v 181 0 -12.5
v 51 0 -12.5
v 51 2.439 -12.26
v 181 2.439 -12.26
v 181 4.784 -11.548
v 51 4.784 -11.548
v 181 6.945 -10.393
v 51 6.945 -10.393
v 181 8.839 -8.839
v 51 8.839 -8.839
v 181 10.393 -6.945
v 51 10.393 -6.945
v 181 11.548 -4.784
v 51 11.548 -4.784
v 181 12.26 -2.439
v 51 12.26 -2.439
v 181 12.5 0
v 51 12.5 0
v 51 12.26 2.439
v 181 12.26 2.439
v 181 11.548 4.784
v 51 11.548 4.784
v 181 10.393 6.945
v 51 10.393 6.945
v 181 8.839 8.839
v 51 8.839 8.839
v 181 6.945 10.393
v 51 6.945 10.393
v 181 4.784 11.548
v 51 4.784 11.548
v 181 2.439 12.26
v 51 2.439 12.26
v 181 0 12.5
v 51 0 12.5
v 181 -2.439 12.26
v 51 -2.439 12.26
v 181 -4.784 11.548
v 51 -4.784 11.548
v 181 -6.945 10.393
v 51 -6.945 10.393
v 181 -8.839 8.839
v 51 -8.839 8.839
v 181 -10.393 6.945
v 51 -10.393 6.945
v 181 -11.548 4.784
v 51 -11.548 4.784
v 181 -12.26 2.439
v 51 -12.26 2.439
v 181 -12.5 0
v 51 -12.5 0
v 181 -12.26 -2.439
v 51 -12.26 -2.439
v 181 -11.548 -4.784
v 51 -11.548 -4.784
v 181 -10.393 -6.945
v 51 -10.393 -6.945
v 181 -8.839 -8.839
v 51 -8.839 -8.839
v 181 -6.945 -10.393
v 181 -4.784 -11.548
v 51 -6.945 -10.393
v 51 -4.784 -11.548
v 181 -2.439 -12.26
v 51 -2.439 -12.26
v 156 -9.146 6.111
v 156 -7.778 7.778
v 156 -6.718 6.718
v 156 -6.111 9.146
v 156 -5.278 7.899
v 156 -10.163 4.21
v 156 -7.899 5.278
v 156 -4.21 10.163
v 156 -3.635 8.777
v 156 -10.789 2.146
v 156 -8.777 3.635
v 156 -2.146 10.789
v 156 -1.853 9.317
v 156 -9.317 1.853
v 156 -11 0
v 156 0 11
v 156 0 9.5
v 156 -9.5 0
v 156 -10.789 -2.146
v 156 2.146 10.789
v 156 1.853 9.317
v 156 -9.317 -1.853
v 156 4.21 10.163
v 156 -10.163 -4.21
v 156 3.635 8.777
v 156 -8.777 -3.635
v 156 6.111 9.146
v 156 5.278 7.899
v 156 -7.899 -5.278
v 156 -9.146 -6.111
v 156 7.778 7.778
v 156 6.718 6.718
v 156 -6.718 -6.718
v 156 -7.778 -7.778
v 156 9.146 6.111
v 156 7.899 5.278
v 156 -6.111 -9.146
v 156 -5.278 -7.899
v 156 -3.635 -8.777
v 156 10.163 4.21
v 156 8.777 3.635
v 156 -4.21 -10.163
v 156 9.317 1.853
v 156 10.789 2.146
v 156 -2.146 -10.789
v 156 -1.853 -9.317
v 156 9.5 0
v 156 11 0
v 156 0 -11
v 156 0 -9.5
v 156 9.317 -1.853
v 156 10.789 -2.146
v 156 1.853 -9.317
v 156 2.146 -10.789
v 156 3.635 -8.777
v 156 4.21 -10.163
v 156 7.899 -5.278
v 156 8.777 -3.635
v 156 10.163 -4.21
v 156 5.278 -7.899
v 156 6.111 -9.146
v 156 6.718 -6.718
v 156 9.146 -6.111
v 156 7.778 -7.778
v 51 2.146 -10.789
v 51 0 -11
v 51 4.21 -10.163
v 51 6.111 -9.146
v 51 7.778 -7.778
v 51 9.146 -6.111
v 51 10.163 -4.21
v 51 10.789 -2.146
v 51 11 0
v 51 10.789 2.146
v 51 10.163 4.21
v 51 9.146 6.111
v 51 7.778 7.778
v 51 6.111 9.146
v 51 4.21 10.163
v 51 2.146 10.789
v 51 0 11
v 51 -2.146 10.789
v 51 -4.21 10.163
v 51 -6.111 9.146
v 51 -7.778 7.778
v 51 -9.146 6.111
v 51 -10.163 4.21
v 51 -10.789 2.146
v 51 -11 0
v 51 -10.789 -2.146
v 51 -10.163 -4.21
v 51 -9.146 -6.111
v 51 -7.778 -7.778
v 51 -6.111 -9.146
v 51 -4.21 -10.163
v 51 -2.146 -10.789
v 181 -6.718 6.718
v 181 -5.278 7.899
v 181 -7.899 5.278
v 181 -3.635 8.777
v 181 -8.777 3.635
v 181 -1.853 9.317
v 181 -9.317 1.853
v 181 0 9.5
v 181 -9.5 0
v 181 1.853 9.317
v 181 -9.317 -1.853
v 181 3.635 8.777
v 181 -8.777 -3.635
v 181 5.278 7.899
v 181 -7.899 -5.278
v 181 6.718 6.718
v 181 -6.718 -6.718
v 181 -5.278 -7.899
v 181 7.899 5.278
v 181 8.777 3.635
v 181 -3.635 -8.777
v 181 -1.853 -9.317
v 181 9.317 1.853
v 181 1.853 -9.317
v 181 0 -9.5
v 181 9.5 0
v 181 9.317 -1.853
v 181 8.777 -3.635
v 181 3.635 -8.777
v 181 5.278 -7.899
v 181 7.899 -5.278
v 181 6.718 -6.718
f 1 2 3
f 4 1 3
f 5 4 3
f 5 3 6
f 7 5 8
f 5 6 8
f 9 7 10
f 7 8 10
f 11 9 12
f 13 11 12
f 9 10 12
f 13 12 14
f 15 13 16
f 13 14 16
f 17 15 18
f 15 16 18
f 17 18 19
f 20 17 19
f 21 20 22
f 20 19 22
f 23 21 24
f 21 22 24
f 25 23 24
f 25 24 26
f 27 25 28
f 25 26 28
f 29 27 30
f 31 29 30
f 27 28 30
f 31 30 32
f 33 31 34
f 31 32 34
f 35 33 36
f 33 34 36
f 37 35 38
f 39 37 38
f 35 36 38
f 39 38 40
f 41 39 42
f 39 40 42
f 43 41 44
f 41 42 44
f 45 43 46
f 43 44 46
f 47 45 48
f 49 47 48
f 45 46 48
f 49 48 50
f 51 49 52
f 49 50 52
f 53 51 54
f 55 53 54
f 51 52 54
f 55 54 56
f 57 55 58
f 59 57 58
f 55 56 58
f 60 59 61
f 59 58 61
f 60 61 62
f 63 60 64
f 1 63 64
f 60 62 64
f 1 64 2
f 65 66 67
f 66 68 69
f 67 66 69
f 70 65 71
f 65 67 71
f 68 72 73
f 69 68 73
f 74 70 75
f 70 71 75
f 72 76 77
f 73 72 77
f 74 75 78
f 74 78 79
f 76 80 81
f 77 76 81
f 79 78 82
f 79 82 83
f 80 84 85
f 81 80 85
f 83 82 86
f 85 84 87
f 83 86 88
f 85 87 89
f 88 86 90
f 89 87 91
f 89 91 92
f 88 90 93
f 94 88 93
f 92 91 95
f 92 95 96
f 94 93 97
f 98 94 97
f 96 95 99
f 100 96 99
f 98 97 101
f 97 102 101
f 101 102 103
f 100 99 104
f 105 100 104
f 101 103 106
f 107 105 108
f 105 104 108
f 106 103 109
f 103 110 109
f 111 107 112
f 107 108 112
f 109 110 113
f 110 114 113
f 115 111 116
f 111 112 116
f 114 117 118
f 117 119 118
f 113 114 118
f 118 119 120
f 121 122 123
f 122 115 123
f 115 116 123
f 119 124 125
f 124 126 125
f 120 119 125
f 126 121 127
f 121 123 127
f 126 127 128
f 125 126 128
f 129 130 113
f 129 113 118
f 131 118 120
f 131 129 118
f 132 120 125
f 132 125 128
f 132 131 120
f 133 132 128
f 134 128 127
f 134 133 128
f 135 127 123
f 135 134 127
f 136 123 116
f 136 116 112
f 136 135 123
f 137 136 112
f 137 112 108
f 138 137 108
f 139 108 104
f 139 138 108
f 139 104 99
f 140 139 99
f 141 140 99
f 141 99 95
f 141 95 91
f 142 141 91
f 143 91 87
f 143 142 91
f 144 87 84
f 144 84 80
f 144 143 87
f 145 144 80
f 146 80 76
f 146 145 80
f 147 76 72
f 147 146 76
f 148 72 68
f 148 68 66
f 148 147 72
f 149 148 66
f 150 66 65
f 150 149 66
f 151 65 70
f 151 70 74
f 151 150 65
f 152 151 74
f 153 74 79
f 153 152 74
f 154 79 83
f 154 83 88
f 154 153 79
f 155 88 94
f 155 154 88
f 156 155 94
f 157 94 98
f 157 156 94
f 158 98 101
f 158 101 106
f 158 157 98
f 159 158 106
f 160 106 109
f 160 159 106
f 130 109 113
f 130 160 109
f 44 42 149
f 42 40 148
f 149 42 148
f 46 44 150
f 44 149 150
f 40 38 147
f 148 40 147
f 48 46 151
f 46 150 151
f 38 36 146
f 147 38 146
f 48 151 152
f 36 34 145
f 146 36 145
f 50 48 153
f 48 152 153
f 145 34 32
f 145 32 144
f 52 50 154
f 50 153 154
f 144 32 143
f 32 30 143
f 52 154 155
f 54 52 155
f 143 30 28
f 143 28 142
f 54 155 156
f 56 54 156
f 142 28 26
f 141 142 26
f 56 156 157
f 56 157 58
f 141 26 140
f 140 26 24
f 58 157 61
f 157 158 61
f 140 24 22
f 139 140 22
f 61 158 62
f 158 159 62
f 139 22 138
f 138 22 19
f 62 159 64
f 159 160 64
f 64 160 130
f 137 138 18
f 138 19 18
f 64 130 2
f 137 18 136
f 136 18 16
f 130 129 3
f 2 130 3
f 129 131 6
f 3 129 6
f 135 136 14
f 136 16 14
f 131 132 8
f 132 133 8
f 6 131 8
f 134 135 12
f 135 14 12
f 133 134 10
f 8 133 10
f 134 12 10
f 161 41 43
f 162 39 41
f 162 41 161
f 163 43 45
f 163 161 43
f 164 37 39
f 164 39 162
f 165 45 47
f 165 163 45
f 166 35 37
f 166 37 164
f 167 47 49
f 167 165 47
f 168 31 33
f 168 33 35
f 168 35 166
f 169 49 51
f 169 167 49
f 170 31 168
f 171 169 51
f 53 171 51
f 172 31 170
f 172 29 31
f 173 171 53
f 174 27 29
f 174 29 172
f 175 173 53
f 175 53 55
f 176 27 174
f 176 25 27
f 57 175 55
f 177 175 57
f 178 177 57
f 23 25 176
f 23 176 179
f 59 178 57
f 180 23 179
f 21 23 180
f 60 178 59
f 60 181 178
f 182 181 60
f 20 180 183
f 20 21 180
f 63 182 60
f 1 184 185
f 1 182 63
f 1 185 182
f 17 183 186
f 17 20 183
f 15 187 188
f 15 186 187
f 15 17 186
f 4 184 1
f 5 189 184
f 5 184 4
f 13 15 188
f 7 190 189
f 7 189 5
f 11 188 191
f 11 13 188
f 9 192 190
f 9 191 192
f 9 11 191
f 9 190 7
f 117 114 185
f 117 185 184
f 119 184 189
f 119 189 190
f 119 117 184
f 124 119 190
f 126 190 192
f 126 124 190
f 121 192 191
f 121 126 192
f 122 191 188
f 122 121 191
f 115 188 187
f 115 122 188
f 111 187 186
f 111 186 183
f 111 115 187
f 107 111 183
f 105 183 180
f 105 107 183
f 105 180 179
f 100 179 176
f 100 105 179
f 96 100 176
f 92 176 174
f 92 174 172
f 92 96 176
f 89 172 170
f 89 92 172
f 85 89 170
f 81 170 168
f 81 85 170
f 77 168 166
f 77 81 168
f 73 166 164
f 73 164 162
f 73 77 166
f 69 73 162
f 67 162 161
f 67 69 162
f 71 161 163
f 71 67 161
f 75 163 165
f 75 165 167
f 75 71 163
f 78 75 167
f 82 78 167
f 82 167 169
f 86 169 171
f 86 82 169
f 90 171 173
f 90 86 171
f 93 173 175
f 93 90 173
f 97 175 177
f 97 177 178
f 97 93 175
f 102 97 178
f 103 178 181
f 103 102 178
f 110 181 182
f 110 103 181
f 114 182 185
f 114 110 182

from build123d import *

# Parameters (mm, degrees)
CYLINDER004_R           = 9.5
CYLINDER004_DEPTH       = 25
CYLINDER004_PITCH_ANGLE = 90
CYLINDER003_R           = 11
CYLINDER003_DEPTH       = 105
CYLINDER003_PITCH_ANGLE = 90
CYLINDER002_R           = 12.5
CYLINDER002_DEPTH       = 130
CYLINDER002_PITCH_ANGLE = 90


with BuildPart() as cylinder002:
    # Cylinder004 → Cylinder004 (new body)
    with BuildSketch(Plane.XY):
        Circle(CYLINDER004_R)
    extrude(amount=CYLINDER004_DEPTH)


with BuildPart() as cylinder002_1:
    # Cylinder004 pitch: moved
    add(cylinder002.part.rotate(Axis((0, 0, 0), (0, 1, 0)), CYLINDER004_PITCH_ANGLE))


with BuildPart() as cylinder002_2:
    # Cylinder004 placement: moved
    add(cylinder002_1.part.moved(Location((156, 0, 0))))


with BuildPart() as cylinder001:
    # Cylinder003 → Cylinder003 (new body)
    with BuildSketch(Plane.XY):
        Circle(CYLINDER003_R)
    extrude(amount=CYLINDER003_DEPTH)


with BuildPart() as cylinder001_1:
    # Cylinder003 pitch: moved
    add(cylinder001.part.rotate(Axis((0, 0, 0), (0, 1, 0)), CYLINDER003_PITCH_ANGLE))


with BuildPart() as cylinder001_2:
    # Cylinder003 placement: moved
    add(cylinder001_1.part.moved(Location((51, 0, 0))))


with BuildPart() as batteryholder:
    # Cylinder002 → Cylinder002 (new body)
    with BuildSketch(Plane.XY):
        Circle(CYLINDER002_R)
    extrude(amount=CYLINDER002_DEPTH)


with BuildPart() as batteryholder_1:
    # Cylinder002 pitch: moved
    add(batteryholder.part.rotate(Axis((0, 0, 0), (0, 1, 0)), CYLINDER002_PITCH_ANGLE))


with BuildPart() as batteryholder_2:
    # Cylinder002 placement: moved
    add(batteryholder_1.part.moved(Location((51, 0, 0))))

    # Cut001: cut Cylinder001
    add(cylinder001_2.part, mode=Mode.SUBTRACT)

    # Cut002: cut Cylinder002
    add(cylinder002_2.part, mode=Mode.SUBTRACT)


solid = batteryholder_2.part
